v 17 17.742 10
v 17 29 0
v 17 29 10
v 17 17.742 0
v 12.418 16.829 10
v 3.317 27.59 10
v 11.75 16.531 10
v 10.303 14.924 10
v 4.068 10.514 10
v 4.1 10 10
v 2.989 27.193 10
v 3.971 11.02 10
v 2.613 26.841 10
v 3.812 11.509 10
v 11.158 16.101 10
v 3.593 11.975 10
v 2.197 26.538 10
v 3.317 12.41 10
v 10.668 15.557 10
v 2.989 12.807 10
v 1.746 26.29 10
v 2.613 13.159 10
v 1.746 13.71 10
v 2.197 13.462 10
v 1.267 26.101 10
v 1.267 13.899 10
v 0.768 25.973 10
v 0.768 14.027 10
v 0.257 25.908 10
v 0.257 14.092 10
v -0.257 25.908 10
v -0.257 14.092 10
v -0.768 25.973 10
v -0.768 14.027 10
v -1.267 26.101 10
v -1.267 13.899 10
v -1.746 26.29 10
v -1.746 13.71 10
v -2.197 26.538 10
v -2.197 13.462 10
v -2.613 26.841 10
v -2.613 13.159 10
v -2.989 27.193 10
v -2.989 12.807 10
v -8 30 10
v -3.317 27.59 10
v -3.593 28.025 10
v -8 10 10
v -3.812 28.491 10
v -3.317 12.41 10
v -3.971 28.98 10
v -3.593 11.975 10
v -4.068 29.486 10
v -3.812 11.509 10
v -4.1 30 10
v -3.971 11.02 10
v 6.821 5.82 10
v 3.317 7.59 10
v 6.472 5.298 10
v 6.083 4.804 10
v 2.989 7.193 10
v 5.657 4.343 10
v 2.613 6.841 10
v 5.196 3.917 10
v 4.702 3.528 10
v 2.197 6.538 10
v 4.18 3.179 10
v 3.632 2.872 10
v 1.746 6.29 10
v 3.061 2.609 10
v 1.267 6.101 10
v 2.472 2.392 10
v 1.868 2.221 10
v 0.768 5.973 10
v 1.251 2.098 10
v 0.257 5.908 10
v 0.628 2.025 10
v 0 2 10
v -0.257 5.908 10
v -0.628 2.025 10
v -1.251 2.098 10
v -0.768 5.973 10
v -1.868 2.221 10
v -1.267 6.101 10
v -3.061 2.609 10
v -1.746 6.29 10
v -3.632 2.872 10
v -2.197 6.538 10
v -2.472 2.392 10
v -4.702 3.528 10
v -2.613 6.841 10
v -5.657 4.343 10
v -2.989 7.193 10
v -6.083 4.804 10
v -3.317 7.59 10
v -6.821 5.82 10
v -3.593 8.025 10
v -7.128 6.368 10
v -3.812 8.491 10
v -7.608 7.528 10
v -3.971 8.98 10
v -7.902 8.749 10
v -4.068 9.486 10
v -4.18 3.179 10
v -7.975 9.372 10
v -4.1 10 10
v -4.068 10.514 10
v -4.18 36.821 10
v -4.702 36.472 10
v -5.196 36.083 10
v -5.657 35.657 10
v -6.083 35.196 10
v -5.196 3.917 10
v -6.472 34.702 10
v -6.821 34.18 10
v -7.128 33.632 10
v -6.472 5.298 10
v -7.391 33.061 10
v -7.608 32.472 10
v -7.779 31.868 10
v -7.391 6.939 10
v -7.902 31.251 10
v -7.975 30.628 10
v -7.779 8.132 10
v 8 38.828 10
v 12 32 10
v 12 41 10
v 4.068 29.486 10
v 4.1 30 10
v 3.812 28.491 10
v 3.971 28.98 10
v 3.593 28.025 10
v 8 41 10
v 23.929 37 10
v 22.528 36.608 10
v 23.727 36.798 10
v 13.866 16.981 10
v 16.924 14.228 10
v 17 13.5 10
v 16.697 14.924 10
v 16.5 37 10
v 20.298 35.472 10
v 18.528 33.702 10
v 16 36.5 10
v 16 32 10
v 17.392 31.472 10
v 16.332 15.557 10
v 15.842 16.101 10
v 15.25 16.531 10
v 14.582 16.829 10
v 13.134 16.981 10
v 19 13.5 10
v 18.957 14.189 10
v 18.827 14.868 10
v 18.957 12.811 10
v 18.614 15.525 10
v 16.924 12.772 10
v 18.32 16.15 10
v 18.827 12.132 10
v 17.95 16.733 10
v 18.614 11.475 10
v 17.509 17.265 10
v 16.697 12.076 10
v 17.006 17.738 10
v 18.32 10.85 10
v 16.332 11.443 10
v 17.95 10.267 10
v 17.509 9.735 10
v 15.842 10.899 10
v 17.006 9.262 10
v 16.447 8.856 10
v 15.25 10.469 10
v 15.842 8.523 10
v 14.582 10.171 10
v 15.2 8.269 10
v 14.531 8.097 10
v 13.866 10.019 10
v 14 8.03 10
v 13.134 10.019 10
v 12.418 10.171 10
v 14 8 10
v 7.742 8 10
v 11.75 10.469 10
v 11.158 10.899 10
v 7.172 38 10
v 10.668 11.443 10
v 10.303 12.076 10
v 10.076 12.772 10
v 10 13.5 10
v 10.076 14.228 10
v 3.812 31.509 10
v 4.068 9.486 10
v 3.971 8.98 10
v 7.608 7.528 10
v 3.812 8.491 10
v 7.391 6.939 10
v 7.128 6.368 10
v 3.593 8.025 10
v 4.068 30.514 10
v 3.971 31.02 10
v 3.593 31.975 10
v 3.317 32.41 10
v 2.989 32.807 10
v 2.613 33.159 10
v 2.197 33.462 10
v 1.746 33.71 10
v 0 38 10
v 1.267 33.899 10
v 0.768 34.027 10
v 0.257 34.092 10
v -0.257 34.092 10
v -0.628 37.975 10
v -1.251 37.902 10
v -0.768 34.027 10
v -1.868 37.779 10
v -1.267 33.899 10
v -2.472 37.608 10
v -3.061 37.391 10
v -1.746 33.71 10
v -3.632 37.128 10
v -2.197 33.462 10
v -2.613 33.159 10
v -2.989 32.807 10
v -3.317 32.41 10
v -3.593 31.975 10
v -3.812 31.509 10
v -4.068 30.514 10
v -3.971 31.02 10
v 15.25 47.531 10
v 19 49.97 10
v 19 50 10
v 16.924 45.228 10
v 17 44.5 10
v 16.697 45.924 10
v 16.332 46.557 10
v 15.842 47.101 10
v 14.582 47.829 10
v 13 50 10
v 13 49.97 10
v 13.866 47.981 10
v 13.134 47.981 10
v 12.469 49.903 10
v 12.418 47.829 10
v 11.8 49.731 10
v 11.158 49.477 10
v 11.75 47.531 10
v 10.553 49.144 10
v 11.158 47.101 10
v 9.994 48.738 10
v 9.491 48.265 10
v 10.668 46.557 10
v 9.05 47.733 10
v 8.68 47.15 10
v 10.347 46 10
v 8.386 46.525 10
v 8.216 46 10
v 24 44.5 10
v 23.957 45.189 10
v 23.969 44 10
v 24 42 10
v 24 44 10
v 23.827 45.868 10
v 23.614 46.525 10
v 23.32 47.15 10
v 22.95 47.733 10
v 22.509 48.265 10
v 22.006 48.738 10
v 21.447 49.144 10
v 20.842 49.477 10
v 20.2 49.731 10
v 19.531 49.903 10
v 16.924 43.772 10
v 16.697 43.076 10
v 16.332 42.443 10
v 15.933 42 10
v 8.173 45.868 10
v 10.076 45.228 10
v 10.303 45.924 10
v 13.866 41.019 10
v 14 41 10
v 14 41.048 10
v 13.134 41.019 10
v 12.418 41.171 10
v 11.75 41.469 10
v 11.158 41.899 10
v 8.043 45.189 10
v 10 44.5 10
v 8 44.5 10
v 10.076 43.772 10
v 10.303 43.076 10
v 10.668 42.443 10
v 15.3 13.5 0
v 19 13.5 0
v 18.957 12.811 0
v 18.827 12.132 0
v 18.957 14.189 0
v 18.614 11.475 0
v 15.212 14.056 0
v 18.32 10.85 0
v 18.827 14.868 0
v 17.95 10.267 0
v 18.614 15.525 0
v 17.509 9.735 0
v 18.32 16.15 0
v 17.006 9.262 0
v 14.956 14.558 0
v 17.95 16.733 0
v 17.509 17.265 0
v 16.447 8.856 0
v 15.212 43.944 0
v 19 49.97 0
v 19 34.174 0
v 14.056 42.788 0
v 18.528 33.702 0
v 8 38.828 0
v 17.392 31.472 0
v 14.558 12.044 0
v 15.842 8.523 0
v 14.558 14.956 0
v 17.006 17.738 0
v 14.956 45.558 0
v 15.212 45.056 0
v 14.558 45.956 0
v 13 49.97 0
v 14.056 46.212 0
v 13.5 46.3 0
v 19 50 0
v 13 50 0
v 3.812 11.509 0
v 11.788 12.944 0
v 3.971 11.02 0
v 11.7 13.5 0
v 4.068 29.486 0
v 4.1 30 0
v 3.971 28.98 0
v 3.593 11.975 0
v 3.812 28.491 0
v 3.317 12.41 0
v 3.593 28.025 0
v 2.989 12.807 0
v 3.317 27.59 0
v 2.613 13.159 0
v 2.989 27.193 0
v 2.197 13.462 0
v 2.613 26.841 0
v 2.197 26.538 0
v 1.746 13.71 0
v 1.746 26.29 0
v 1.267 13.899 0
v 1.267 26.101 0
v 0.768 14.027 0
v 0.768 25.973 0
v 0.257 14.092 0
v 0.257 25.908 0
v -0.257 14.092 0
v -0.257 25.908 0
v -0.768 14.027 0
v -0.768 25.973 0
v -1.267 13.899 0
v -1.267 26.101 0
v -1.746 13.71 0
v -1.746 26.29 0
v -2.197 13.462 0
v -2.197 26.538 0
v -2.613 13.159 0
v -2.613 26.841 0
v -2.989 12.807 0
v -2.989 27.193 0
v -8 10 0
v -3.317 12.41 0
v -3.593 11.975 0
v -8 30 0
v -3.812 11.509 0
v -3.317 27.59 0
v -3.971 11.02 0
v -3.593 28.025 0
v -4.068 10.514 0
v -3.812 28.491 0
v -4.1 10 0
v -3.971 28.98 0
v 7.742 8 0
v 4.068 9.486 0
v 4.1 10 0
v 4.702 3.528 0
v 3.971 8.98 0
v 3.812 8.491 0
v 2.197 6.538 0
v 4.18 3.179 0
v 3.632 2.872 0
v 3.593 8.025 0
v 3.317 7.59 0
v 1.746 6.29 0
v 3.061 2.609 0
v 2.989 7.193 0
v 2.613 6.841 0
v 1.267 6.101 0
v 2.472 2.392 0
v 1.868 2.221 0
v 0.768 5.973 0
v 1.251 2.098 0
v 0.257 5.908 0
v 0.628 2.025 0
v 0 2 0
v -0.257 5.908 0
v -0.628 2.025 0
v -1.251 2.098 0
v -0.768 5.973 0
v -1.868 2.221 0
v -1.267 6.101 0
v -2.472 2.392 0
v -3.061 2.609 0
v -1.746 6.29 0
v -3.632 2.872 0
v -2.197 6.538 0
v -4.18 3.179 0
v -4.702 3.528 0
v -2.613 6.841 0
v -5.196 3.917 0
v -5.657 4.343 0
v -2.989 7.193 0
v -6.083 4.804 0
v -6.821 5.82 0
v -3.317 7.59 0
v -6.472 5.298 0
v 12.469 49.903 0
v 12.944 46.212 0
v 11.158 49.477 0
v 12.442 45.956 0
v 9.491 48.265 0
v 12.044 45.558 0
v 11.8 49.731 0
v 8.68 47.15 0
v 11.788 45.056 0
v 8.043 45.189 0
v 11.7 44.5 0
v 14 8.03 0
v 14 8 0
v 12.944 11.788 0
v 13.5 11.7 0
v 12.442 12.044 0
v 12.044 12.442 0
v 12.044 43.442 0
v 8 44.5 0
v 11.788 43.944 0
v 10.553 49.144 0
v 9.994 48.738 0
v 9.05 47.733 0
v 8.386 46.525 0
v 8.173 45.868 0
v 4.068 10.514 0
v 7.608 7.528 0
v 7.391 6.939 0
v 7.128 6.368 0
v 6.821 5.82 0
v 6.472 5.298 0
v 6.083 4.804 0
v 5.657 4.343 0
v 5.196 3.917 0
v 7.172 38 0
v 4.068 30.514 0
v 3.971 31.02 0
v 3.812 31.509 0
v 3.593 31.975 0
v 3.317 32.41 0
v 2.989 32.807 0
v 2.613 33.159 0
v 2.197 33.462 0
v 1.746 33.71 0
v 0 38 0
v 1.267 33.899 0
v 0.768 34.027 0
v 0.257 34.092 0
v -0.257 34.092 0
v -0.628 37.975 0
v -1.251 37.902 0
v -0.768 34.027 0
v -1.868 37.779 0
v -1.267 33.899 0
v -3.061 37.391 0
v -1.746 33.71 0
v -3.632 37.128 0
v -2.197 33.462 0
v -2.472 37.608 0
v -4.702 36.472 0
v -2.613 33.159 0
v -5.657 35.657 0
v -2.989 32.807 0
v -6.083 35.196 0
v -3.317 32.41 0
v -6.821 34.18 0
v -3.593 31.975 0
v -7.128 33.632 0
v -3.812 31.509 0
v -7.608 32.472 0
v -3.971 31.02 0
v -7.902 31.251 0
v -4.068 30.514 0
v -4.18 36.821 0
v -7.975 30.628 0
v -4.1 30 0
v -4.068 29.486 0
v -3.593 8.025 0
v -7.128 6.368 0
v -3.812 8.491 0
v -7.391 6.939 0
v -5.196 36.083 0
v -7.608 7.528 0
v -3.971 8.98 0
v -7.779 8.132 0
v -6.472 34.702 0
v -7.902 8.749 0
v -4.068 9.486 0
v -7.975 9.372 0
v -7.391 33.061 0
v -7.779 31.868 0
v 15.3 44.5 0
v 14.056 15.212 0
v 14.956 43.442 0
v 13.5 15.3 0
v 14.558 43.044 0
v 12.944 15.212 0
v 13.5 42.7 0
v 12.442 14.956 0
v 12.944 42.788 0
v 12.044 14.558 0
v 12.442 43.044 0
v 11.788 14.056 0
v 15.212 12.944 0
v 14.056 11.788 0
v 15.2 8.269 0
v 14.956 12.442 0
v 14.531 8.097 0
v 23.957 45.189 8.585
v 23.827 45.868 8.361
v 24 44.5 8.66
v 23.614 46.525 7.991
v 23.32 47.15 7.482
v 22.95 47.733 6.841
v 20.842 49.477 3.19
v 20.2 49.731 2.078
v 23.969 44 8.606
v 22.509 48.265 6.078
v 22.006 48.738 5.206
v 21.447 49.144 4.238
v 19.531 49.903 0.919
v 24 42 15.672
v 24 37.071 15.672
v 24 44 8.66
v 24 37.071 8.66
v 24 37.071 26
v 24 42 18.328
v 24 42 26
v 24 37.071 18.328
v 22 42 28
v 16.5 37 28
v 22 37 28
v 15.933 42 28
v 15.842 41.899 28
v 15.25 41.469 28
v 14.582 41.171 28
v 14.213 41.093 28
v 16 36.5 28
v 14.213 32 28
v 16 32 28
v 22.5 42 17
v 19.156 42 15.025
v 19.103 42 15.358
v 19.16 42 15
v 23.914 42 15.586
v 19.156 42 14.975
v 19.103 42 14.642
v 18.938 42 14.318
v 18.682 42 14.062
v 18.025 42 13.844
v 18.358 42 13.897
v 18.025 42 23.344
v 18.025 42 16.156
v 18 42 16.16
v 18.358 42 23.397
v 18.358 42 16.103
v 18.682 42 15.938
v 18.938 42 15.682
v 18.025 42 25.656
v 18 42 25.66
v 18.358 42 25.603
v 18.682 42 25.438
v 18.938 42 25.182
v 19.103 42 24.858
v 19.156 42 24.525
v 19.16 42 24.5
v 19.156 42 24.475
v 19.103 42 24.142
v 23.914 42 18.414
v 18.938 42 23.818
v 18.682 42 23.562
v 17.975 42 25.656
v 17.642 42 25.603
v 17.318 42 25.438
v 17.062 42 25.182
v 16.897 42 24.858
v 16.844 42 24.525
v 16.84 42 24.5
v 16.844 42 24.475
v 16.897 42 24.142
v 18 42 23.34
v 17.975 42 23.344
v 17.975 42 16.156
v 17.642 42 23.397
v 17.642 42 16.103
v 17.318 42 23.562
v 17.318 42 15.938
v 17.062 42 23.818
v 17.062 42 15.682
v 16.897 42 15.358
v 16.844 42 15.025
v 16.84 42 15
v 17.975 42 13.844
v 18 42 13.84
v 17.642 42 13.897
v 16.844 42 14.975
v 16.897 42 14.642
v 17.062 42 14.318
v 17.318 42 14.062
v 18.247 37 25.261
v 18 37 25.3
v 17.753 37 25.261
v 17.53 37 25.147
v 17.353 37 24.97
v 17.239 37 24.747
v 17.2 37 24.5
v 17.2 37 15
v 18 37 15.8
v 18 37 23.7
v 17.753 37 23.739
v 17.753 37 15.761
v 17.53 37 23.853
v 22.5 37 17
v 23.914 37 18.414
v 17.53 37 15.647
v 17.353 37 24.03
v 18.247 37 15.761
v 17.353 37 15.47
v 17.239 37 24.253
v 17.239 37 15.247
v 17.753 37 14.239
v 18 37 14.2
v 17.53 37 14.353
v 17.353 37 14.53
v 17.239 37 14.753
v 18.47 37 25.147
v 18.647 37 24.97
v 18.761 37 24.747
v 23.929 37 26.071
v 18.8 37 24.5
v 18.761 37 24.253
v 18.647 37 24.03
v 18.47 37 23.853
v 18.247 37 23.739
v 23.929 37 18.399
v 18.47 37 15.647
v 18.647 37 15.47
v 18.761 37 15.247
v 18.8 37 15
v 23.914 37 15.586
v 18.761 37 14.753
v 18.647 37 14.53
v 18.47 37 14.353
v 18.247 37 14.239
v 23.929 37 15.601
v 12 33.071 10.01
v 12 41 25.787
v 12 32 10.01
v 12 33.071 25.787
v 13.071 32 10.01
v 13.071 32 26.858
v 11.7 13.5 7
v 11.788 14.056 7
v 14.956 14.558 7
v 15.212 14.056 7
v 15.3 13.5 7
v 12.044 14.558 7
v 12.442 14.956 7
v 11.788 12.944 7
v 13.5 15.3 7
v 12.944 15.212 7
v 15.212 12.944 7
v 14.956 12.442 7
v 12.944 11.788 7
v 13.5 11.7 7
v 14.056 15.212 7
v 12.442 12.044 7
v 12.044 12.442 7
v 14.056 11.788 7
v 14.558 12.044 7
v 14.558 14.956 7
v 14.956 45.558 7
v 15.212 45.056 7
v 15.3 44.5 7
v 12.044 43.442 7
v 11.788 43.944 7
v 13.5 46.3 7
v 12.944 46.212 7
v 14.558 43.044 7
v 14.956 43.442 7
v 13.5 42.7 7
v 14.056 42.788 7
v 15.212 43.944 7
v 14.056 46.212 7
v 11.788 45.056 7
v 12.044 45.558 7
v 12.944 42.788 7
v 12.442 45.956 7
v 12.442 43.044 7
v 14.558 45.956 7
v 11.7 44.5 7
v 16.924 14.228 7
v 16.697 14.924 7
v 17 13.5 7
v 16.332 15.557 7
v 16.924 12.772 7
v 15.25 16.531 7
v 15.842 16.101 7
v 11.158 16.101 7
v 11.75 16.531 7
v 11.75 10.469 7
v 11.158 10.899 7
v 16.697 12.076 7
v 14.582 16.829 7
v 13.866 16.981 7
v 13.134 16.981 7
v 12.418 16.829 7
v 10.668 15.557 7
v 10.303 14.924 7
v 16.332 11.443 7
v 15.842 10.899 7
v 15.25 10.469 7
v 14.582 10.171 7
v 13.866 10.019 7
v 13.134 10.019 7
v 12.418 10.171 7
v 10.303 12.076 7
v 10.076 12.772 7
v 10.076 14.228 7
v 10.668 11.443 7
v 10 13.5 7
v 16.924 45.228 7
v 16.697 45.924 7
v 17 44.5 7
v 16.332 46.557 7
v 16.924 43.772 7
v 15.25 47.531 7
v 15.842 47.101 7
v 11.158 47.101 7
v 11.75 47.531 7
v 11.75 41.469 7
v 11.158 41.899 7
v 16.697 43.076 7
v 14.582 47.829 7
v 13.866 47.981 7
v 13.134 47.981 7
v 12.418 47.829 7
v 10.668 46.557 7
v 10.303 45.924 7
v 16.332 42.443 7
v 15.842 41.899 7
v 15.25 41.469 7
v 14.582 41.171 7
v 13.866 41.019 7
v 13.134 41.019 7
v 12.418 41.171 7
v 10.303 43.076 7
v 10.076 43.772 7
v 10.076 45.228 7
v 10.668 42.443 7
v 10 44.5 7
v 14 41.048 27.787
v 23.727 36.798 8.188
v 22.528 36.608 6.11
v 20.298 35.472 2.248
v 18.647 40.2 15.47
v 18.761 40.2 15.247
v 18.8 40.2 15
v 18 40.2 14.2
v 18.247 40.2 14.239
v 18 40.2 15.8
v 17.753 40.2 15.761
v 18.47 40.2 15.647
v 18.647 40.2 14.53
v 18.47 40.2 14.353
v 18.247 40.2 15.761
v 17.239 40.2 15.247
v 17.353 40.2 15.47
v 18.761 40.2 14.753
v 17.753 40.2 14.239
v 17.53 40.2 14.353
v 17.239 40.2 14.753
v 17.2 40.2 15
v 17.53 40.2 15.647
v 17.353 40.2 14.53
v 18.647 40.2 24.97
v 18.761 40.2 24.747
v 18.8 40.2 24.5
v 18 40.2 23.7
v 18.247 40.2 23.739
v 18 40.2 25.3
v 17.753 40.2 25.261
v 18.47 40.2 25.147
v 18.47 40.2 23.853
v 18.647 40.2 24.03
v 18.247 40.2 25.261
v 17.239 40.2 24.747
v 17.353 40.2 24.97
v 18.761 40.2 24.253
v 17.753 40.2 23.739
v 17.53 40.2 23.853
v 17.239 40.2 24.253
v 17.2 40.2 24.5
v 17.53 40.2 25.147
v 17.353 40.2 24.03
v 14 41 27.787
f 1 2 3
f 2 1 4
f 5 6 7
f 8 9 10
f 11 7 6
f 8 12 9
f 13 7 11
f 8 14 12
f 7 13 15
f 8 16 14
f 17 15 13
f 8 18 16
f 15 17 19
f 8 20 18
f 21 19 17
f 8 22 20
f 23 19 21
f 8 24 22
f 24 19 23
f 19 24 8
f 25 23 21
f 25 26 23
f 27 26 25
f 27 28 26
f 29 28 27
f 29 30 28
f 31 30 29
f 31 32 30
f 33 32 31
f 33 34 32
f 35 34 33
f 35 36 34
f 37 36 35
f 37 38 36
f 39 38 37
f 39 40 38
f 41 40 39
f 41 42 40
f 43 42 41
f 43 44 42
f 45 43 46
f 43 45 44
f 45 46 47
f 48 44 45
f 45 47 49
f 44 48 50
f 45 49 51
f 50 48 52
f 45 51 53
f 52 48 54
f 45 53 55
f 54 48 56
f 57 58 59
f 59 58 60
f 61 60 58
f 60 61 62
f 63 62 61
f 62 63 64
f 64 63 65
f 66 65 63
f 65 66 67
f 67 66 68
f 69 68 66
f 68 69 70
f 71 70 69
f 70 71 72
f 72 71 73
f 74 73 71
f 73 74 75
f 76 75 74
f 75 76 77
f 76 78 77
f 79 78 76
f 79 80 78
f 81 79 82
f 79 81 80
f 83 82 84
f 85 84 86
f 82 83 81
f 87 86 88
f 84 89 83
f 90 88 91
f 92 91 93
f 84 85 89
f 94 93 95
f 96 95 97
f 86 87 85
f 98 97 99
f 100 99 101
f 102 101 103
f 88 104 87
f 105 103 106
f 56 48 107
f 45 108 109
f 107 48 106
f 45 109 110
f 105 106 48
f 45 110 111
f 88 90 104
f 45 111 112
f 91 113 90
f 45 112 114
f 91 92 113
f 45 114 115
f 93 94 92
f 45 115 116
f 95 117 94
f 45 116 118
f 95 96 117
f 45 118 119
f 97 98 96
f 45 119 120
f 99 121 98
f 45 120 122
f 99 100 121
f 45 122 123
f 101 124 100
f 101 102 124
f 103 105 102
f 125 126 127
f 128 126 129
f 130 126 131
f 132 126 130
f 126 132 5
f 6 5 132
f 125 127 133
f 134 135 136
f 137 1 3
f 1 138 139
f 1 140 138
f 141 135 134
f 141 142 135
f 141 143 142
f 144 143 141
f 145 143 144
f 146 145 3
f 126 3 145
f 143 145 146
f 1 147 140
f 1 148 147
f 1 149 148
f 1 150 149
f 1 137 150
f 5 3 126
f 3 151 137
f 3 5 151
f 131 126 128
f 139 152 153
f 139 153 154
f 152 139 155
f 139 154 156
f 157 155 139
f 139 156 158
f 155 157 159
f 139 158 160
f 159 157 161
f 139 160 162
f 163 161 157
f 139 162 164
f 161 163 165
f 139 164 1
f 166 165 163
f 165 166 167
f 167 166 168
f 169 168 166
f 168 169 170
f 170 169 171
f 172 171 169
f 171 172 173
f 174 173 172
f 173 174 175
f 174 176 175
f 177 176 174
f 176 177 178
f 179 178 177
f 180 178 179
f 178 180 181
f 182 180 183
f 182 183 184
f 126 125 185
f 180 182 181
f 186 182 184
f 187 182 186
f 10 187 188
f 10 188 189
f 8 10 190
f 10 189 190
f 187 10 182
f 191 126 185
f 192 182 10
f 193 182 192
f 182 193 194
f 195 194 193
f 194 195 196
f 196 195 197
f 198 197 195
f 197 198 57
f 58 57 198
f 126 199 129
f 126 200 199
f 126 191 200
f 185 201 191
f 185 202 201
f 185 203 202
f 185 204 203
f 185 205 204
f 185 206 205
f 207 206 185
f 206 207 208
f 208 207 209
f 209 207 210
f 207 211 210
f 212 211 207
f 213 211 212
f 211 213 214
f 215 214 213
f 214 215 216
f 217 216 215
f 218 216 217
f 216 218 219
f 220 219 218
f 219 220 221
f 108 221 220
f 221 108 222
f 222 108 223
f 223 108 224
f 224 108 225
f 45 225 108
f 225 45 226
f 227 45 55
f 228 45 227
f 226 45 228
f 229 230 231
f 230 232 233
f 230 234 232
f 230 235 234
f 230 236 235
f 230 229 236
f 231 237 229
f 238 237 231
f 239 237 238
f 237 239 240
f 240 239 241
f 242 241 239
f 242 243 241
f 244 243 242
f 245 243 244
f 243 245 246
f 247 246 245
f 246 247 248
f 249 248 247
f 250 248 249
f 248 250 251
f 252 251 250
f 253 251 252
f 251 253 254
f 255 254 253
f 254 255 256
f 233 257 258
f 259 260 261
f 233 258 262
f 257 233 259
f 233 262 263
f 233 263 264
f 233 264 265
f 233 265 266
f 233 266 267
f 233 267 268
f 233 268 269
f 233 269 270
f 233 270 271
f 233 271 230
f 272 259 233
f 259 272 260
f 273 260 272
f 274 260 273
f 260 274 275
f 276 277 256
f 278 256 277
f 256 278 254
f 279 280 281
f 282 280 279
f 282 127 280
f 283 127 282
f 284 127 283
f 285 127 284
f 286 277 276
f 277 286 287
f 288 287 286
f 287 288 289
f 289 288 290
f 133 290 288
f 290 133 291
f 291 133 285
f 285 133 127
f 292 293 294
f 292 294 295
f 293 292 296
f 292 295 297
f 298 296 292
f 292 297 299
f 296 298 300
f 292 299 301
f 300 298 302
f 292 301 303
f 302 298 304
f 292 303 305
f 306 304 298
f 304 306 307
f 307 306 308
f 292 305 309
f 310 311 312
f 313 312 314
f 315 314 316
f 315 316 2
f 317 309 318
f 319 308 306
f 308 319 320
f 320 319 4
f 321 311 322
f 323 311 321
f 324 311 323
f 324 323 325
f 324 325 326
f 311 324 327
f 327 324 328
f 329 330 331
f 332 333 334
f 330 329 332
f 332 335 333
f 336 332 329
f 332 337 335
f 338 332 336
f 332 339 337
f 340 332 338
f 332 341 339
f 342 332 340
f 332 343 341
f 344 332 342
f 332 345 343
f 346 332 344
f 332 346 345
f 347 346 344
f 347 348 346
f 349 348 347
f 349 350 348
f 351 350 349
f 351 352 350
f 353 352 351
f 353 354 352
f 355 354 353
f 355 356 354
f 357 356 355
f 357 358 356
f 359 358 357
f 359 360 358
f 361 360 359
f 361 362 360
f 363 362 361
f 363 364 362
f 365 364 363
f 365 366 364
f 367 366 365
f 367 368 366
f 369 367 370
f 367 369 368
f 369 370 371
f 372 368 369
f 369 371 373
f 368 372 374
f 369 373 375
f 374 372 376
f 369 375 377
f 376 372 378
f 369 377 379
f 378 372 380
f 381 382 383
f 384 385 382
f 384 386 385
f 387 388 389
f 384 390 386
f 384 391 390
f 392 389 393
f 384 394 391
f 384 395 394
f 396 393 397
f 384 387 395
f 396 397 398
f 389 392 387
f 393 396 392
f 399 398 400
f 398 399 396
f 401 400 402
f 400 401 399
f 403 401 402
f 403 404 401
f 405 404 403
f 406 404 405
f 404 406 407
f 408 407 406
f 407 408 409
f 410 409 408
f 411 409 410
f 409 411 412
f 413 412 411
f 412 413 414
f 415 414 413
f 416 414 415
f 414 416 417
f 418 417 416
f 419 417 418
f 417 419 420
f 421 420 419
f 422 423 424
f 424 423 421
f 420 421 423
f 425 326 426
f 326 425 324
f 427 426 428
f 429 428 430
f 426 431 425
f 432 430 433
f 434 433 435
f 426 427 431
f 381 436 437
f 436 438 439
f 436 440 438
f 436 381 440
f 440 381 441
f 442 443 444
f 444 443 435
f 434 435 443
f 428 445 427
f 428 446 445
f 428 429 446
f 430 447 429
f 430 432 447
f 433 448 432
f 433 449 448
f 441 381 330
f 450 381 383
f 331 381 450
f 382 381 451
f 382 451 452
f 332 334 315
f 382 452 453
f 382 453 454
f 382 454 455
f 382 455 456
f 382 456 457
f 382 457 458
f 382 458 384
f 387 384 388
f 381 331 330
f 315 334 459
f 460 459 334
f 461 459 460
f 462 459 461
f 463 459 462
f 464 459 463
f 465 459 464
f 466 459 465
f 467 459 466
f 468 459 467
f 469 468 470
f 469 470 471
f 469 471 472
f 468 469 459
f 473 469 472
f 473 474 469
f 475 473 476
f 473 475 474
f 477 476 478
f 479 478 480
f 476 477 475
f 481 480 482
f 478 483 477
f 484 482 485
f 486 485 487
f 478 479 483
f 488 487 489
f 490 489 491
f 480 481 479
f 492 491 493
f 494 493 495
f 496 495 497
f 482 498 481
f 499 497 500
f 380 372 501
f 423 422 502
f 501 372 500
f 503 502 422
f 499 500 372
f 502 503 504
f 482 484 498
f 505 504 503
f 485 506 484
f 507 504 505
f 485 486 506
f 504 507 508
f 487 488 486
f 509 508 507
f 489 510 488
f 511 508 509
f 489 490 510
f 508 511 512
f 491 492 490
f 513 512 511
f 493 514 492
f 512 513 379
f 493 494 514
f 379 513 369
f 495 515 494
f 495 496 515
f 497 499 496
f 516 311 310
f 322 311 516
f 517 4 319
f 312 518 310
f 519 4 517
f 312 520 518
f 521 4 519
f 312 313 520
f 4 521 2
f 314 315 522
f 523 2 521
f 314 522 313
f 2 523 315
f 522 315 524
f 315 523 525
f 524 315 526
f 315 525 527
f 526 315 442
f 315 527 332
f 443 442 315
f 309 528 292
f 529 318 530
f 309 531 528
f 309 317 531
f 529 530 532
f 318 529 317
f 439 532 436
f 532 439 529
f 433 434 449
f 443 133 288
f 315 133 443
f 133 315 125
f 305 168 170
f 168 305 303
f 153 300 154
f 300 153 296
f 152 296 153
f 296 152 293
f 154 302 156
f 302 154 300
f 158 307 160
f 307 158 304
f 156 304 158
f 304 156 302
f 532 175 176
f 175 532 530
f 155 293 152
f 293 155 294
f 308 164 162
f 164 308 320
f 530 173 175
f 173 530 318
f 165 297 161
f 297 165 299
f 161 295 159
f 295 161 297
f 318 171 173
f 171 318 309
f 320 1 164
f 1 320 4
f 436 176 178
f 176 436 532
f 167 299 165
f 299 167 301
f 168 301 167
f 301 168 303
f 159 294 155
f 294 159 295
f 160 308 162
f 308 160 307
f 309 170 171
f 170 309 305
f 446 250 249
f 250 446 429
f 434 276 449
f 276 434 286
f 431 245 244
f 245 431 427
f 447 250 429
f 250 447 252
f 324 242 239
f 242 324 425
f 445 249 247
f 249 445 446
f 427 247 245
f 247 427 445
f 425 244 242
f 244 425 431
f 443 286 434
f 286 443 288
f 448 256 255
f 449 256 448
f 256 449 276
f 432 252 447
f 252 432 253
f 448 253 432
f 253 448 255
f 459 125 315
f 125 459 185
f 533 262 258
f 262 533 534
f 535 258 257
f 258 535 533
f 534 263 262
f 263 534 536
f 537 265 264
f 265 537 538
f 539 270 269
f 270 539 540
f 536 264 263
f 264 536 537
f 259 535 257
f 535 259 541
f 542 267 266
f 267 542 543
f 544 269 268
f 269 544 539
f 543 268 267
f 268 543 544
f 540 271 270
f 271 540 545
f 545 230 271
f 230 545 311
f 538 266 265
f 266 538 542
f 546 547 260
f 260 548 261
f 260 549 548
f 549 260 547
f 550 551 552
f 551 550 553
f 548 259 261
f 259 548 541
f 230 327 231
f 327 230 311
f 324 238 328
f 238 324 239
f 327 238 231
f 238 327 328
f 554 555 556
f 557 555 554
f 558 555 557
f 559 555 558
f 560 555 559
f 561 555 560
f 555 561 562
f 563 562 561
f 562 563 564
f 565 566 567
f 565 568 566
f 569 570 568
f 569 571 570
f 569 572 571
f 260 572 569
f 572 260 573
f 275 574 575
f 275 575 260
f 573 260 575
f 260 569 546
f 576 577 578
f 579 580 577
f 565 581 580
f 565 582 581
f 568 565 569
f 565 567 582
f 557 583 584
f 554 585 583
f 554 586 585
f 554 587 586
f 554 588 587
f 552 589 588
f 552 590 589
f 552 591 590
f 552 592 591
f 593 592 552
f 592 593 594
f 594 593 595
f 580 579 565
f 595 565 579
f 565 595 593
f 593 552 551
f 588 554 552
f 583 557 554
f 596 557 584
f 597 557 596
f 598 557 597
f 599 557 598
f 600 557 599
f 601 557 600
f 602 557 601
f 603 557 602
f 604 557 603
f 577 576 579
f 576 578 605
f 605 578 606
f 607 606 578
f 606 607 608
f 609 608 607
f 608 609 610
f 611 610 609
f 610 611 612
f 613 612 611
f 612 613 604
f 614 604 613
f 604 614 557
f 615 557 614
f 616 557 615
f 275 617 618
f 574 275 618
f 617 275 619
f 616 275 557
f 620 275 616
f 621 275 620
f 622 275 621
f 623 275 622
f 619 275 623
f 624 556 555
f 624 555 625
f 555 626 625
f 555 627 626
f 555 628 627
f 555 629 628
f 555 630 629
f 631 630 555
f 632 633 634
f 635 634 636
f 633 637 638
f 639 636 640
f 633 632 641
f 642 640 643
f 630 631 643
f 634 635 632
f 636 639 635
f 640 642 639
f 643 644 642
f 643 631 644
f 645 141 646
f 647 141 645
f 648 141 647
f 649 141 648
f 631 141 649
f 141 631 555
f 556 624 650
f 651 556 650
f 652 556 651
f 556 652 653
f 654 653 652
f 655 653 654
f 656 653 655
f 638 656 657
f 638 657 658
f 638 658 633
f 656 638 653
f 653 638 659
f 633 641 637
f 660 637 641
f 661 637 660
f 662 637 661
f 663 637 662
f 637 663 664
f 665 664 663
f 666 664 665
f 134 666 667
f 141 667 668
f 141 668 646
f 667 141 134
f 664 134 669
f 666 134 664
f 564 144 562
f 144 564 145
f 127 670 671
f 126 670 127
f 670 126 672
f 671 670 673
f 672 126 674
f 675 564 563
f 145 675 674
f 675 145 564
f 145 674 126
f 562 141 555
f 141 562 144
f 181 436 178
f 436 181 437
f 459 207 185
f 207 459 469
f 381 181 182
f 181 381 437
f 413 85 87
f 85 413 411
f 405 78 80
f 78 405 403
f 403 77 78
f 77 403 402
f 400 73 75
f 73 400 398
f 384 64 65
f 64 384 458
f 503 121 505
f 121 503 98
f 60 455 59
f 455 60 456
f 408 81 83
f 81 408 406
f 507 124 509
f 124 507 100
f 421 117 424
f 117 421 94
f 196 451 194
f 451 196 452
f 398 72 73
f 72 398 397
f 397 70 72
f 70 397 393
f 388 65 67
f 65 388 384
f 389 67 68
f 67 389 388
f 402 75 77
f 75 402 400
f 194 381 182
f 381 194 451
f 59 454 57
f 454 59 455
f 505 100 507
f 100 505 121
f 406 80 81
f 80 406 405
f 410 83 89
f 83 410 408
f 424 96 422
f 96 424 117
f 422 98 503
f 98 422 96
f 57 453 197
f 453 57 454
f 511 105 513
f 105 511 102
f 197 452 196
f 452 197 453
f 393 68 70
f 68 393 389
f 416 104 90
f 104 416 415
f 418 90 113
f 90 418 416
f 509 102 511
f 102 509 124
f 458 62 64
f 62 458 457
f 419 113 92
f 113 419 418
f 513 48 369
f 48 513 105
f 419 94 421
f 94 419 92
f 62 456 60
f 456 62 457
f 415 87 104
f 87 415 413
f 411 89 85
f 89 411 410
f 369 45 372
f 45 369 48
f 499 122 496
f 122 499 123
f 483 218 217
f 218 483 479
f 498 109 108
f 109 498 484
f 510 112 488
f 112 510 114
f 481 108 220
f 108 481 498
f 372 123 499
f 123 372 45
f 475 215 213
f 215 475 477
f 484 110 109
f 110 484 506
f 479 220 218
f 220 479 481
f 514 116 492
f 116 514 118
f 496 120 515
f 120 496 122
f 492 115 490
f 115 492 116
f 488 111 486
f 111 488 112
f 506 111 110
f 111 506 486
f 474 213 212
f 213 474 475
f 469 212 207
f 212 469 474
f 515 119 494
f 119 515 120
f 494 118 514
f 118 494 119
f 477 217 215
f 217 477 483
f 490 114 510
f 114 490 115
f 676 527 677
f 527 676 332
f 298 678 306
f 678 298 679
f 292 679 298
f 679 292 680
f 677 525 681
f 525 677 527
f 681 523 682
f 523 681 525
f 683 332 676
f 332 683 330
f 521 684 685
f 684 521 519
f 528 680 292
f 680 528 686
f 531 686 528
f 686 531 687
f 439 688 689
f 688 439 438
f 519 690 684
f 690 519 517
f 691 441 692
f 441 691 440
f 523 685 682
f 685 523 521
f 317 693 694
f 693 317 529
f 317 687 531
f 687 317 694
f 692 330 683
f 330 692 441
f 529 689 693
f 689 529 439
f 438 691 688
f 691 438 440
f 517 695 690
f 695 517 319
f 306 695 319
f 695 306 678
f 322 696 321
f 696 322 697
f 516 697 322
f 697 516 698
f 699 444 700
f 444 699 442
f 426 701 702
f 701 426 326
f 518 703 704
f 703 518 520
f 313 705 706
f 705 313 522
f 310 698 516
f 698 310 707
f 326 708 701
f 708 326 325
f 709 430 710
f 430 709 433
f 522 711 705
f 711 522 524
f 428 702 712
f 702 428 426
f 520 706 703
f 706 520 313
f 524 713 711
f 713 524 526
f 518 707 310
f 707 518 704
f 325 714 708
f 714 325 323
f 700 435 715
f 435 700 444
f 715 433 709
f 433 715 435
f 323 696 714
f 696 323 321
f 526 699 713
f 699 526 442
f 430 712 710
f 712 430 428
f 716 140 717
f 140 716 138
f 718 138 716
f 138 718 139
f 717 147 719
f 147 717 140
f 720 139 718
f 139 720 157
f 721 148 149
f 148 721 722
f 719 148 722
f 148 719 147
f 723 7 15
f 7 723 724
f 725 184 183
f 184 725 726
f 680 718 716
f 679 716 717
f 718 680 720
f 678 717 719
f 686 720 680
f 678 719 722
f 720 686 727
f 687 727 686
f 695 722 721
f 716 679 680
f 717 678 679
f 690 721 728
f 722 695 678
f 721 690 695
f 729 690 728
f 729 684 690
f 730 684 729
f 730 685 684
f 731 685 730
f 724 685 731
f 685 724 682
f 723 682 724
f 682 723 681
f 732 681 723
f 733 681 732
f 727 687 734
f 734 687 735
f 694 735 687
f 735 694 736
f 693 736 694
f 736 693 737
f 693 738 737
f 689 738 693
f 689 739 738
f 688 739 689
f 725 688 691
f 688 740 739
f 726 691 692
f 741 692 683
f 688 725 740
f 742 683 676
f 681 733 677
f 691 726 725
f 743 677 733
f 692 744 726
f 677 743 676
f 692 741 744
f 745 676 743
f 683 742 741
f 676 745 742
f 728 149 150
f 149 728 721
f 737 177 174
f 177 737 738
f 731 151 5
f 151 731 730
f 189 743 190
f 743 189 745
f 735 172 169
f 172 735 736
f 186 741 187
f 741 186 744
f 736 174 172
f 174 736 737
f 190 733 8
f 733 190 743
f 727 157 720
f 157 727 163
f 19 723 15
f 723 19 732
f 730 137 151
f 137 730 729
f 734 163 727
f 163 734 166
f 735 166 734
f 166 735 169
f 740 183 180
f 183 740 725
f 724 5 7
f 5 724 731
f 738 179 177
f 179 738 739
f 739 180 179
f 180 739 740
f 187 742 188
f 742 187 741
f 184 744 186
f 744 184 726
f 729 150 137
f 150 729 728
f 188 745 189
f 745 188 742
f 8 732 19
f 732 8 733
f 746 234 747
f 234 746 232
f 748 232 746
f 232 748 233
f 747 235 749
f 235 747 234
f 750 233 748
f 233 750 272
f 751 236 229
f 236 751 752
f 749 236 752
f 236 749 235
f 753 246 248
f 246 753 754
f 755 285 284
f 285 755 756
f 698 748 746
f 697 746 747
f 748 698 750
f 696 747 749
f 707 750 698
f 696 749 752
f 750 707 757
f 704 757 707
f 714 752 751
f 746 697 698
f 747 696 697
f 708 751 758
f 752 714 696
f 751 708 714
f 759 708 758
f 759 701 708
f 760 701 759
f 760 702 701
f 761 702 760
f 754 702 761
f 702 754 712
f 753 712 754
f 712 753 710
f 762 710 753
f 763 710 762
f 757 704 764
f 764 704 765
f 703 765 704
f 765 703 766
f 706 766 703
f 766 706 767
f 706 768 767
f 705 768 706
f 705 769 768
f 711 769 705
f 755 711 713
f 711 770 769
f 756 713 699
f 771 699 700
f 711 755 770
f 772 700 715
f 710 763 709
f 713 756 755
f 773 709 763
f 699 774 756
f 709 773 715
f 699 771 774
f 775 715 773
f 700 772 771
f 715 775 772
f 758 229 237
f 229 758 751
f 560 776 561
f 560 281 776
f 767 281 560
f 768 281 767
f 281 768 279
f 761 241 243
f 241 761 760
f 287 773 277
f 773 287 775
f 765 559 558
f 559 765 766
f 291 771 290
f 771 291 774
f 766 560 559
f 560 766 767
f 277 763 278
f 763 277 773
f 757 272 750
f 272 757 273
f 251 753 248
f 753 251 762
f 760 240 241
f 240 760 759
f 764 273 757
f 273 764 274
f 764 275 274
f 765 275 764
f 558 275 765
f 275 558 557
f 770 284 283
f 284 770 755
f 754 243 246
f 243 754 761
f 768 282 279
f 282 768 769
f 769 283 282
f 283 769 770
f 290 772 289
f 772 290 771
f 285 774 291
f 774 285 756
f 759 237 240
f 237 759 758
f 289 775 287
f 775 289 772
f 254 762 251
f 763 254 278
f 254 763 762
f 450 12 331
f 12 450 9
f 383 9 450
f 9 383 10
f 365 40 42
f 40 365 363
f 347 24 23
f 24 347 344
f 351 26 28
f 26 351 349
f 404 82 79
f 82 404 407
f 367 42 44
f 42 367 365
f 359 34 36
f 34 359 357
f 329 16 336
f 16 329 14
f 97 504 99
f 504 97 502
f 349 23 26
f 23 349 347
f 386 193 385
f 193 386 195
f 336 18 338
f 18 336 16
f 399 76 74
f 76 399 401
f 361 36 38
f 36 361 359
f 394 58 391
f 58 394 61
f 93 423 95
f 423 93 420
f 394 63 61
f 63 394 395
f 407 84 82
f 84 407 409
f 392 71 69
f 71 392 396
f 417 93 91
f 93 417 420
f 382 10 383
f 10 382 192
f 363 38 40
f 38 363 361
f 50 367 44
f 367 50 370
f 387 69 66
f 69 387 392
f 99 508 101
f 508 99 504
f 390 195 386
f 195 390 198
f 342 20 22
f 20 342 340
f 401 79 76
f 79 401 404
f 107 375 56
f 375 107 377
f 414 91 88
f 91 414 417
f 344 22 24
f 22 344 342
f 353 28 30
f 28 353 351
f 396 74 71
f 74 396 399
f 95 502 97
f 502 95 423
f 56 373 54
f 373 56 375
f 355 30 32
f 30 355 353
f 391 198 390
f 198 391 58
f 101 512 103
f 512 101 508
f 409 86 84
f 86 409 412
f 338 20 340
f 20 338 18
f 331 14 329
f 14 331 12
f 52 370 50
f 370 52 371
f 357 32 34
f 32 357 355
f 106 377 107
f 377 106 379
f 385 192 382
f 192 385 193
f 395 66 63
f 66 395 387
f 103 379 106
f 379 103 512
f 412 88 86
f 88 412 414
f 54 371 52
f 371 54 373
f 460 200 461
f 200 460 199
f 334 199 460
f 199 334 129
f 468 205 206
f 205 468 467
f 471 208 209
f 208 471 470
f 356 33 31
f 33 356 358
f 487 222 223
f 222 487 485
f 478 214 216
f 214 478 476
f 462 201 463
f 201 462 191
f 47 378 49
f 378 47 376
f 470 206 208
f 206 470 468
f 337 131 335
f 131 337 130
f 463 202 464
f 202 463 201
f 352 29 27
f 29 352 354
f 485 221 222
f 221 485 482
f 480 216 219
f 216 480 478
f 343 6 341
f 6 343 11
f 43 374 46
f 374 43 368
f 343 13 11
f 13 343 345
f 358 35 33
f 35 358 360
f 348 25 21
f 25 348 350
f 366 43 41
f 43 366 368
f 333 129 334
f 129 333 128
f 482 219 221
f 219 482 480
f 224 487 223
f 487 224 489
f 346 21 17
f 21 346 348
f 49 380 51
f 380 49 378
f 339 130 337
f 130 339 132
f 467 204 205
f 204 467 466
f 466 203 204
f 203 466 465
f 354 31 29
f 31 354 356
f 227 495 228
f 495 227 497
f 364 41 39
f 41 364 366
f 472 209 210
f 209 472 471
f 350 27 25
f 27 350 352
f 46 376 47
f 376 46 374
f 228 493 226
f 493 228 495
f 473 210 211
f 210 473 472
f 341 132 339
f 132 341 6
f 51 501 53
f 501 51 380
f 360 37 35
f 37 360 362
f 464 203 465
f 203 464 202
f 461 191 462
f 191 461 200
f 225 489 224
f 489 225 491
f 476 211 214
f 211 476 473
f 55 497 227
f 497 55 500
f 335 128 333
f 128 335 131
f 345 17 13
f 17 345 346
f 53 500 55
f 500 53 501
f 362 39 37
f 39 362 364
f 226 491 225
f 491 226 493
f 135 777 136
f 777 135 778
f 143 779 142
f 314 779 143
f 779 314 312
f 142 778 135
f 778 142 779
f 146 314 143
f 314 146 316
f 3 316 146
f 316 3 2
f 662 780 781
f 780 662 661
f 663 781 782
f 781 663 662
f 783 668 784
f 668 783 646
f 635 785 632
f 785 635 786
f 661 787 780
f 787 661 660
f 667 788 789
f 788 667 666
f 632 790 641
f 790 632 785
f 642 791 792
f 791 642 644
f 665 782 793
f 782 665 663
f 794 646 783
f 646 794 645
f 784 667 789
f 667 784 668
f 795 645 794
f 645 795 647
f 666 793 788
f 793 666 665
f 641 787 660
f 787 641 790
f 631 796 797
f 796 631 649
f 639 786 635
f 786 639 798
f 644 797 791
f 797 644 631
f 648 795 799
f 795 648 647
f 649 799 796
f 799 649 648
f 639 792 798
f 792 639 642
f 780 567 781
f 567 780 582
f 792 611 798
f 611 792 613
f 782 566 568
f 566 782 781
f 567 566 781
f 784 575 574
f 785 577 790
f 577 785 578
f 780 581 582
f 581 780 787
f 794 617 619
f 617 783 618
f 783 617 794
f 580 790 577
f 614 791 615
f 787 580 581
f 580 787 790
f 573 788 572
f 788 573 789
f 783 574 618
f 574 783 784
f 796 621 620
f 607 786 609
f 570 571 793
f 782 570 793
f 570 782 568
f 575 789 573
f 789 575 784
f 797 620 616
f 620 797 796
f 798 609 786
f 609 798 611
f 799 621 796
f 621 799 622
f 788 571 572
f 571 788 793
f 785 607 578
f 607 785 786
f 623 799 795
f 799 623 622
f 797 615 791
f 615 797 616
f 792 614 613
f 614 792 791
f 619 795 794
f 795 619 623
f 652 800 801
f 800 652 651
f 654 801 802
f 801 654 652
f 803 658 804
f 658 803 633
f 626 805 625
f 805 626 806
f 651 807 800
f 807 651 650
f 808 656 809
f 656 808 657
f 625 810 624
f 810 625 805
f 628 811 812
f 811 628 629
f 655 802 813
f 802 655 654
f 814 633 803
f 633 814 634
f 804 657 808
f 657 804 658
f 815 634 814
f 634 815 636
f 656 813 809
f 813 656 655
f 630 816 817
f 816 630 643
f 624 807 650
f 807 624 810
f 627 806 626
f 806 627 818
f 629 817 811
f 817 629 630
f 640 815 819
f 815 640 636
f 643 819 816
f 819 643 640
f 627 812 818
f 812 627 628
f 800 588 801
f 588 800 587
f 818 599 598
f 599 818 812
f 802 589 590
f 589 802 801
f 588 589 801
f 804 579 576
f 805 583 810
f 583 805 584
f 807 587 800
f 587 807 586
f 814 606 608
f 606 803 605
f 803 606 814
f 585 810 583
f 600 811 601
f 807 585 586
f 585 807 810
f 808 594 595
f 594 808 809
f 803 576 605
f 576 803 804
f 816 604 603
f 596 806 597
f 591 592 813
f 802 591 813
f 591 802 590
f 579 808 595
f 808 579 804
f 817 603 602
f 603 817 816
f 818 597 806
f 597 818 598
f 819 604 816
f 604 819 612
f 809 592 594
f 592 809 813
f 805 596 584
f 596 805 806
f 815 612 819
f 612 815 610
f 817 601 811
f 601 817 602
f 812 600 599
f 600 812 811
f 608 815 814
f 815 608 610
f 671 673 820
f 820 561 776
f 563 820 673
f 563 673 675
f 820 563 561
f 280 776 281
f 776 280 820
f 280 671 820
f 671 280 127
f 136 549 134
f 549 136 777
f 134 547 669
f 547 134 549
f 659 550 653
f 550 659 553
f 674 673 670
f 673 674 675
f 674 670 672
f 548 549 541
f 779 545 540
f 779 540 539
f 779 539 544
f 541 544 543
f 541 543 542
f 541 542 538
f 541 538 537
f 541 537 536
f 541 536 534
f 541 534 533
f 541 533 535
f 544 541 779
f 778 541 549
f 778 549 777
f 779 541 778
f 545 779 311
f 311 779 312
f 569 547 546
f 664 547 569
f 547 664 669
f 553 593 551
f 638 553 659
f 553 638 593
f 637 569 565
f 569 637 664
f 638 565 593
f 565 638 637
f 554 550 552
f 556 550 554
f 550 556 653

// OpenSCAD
// PRUSA iteration3
// Y motor mount
// GNU GPL v3
// Josef Průša <iam@josefprusa.cz> and contributors
// http://www.reprap.org/wiki/Prusa_Mendel
// http://prusamendel.org

//include <configuration.scad>

module y_motor_base(){
 // Motor holding part
    translate(v = [29,-21+50,0]){
    translate(v = [-21+4.5,0,5]) cube(size = [9,31,10], center=true);
    translate(v = [-15.5,-15.5,0]) cylinder(h = 10, r=5.5, $fn=50);
    translate(v = [-15.5,+15.5,0]) cylinder(h = 10, r=5.5, $fn=50);
    translate([-21,7,0]) rotate([0,0,45]) cube([2, 2, 10]);    

    //end stop
    translate(v = [-10.5,+15.5,0]) cylinder(h = 10, r=5.5, $fn=50);
    translate([-12,0,0]) cube([7, 15, 10]);
    translate([-16,16,0]) cube([6, 5, 10]);
    translate([-21+6,8,0]) cube([12-2, 5, 28]);
    translate([-21+6-2,8-5,0]) cube([4, 10, 28]);
    translate([-21+9.5-2,7,0]) rotate([0,0,45]) cube([2, 2, 28]);    
  // Joins motor holder and rod plate
  translate(v = [-29,-21,0]) cube(size = [14,30,10]);
 }
 // Front holding part
 translate(v = [0,10,0]) cylinder(h = 10, r=8, $fn=80);
 translate(v = [0,20,5])cube(size = [16,20,10], center=true);	
 translate(v = [0,30,0])cylinder(h = 10, r=8, $fn=80);
}

module y_motor_holes(){
 translate(v = [29,-21+50,0]){
  // Screw head holes
  translate(v = [-15.5,-15.5,-1]) cylinder(h = 10, r=1.8, $fn=20);
  translate(v = [-15.5,+15.5,-1]) cylinder(h = 10, r=1.8, $fn=20);
  // Screw holes
  translate(v = [-15.5,-15.5,7]) cylinder(h = 7, r=3.5, $fn=30);
  translate(v = [-15.5,+15.5,7]) cylinder(h = 25, r=3.5, $fn=30);
 }
 translate(v = [0,10,-1]) cylinder(h = 12, r=4.1, $fn=50);	
 translate(v = [0,30,-1]) cylinder(h = 12, r=4.1, $fn=50);
 
 //endstop
    translate([25,29,0])  cylinder(h = 29, r=8, $fn=20); 
   
    #translate([18,45,15]) rotate([90,0,0]) cylinder(h = 10, r=0.8, $fn=20);
    translate([18,42.2,15]) rotate([90,0,0]) cylinder(h = 2, r1=1.2, r2=0.8, $fn=20);
 
    #translate([18,45,24.5]) rotate([90,0,0]) cylinder(h = 10, r=0.8, $fn=20);
    translate([18,42.2,24.5]) rotate([90,0,0]) cylinder(h = 2, r1=1.2, r2=0.8, $fn=20);
   
    // endstop corner cutout
    translate([-5-2,30,28]) rotate([0,45,0]) cube([15, 19, 15]);	
    translate([-1,41,10])  cube([15, 5, 19]);	
    translate([27,33,0]) rotate([0,0,45]) cube([5, 5, 28]);	
    translate([12-2,28,10.01]) rotate([0,0,45]) cube([5, 5, 28]); 
    //why 10.01? I make first 10!!!!!!!!!!!!!!!!!!!!!!!!!!!!!!!!!!!!!!!!!!!!
    
    translate([19,32,0]) rotate([0,30,0]) cube([8, 20, 18]);	
    translate([24.5-2,32,17]) rotate([0,45,0]) cube([2, 20, 2]);	
    
    translate([23-2,32,29]) rotate([0,45,0]) cube([5, 20, 5]);	
}




//#translate([18,40,10]) cube([8, 5, 5]);	

// Final part
module y_motor(){
 difference(){
  y_motor_base();
  y_motor_holes();
 }
}

y_motor();
